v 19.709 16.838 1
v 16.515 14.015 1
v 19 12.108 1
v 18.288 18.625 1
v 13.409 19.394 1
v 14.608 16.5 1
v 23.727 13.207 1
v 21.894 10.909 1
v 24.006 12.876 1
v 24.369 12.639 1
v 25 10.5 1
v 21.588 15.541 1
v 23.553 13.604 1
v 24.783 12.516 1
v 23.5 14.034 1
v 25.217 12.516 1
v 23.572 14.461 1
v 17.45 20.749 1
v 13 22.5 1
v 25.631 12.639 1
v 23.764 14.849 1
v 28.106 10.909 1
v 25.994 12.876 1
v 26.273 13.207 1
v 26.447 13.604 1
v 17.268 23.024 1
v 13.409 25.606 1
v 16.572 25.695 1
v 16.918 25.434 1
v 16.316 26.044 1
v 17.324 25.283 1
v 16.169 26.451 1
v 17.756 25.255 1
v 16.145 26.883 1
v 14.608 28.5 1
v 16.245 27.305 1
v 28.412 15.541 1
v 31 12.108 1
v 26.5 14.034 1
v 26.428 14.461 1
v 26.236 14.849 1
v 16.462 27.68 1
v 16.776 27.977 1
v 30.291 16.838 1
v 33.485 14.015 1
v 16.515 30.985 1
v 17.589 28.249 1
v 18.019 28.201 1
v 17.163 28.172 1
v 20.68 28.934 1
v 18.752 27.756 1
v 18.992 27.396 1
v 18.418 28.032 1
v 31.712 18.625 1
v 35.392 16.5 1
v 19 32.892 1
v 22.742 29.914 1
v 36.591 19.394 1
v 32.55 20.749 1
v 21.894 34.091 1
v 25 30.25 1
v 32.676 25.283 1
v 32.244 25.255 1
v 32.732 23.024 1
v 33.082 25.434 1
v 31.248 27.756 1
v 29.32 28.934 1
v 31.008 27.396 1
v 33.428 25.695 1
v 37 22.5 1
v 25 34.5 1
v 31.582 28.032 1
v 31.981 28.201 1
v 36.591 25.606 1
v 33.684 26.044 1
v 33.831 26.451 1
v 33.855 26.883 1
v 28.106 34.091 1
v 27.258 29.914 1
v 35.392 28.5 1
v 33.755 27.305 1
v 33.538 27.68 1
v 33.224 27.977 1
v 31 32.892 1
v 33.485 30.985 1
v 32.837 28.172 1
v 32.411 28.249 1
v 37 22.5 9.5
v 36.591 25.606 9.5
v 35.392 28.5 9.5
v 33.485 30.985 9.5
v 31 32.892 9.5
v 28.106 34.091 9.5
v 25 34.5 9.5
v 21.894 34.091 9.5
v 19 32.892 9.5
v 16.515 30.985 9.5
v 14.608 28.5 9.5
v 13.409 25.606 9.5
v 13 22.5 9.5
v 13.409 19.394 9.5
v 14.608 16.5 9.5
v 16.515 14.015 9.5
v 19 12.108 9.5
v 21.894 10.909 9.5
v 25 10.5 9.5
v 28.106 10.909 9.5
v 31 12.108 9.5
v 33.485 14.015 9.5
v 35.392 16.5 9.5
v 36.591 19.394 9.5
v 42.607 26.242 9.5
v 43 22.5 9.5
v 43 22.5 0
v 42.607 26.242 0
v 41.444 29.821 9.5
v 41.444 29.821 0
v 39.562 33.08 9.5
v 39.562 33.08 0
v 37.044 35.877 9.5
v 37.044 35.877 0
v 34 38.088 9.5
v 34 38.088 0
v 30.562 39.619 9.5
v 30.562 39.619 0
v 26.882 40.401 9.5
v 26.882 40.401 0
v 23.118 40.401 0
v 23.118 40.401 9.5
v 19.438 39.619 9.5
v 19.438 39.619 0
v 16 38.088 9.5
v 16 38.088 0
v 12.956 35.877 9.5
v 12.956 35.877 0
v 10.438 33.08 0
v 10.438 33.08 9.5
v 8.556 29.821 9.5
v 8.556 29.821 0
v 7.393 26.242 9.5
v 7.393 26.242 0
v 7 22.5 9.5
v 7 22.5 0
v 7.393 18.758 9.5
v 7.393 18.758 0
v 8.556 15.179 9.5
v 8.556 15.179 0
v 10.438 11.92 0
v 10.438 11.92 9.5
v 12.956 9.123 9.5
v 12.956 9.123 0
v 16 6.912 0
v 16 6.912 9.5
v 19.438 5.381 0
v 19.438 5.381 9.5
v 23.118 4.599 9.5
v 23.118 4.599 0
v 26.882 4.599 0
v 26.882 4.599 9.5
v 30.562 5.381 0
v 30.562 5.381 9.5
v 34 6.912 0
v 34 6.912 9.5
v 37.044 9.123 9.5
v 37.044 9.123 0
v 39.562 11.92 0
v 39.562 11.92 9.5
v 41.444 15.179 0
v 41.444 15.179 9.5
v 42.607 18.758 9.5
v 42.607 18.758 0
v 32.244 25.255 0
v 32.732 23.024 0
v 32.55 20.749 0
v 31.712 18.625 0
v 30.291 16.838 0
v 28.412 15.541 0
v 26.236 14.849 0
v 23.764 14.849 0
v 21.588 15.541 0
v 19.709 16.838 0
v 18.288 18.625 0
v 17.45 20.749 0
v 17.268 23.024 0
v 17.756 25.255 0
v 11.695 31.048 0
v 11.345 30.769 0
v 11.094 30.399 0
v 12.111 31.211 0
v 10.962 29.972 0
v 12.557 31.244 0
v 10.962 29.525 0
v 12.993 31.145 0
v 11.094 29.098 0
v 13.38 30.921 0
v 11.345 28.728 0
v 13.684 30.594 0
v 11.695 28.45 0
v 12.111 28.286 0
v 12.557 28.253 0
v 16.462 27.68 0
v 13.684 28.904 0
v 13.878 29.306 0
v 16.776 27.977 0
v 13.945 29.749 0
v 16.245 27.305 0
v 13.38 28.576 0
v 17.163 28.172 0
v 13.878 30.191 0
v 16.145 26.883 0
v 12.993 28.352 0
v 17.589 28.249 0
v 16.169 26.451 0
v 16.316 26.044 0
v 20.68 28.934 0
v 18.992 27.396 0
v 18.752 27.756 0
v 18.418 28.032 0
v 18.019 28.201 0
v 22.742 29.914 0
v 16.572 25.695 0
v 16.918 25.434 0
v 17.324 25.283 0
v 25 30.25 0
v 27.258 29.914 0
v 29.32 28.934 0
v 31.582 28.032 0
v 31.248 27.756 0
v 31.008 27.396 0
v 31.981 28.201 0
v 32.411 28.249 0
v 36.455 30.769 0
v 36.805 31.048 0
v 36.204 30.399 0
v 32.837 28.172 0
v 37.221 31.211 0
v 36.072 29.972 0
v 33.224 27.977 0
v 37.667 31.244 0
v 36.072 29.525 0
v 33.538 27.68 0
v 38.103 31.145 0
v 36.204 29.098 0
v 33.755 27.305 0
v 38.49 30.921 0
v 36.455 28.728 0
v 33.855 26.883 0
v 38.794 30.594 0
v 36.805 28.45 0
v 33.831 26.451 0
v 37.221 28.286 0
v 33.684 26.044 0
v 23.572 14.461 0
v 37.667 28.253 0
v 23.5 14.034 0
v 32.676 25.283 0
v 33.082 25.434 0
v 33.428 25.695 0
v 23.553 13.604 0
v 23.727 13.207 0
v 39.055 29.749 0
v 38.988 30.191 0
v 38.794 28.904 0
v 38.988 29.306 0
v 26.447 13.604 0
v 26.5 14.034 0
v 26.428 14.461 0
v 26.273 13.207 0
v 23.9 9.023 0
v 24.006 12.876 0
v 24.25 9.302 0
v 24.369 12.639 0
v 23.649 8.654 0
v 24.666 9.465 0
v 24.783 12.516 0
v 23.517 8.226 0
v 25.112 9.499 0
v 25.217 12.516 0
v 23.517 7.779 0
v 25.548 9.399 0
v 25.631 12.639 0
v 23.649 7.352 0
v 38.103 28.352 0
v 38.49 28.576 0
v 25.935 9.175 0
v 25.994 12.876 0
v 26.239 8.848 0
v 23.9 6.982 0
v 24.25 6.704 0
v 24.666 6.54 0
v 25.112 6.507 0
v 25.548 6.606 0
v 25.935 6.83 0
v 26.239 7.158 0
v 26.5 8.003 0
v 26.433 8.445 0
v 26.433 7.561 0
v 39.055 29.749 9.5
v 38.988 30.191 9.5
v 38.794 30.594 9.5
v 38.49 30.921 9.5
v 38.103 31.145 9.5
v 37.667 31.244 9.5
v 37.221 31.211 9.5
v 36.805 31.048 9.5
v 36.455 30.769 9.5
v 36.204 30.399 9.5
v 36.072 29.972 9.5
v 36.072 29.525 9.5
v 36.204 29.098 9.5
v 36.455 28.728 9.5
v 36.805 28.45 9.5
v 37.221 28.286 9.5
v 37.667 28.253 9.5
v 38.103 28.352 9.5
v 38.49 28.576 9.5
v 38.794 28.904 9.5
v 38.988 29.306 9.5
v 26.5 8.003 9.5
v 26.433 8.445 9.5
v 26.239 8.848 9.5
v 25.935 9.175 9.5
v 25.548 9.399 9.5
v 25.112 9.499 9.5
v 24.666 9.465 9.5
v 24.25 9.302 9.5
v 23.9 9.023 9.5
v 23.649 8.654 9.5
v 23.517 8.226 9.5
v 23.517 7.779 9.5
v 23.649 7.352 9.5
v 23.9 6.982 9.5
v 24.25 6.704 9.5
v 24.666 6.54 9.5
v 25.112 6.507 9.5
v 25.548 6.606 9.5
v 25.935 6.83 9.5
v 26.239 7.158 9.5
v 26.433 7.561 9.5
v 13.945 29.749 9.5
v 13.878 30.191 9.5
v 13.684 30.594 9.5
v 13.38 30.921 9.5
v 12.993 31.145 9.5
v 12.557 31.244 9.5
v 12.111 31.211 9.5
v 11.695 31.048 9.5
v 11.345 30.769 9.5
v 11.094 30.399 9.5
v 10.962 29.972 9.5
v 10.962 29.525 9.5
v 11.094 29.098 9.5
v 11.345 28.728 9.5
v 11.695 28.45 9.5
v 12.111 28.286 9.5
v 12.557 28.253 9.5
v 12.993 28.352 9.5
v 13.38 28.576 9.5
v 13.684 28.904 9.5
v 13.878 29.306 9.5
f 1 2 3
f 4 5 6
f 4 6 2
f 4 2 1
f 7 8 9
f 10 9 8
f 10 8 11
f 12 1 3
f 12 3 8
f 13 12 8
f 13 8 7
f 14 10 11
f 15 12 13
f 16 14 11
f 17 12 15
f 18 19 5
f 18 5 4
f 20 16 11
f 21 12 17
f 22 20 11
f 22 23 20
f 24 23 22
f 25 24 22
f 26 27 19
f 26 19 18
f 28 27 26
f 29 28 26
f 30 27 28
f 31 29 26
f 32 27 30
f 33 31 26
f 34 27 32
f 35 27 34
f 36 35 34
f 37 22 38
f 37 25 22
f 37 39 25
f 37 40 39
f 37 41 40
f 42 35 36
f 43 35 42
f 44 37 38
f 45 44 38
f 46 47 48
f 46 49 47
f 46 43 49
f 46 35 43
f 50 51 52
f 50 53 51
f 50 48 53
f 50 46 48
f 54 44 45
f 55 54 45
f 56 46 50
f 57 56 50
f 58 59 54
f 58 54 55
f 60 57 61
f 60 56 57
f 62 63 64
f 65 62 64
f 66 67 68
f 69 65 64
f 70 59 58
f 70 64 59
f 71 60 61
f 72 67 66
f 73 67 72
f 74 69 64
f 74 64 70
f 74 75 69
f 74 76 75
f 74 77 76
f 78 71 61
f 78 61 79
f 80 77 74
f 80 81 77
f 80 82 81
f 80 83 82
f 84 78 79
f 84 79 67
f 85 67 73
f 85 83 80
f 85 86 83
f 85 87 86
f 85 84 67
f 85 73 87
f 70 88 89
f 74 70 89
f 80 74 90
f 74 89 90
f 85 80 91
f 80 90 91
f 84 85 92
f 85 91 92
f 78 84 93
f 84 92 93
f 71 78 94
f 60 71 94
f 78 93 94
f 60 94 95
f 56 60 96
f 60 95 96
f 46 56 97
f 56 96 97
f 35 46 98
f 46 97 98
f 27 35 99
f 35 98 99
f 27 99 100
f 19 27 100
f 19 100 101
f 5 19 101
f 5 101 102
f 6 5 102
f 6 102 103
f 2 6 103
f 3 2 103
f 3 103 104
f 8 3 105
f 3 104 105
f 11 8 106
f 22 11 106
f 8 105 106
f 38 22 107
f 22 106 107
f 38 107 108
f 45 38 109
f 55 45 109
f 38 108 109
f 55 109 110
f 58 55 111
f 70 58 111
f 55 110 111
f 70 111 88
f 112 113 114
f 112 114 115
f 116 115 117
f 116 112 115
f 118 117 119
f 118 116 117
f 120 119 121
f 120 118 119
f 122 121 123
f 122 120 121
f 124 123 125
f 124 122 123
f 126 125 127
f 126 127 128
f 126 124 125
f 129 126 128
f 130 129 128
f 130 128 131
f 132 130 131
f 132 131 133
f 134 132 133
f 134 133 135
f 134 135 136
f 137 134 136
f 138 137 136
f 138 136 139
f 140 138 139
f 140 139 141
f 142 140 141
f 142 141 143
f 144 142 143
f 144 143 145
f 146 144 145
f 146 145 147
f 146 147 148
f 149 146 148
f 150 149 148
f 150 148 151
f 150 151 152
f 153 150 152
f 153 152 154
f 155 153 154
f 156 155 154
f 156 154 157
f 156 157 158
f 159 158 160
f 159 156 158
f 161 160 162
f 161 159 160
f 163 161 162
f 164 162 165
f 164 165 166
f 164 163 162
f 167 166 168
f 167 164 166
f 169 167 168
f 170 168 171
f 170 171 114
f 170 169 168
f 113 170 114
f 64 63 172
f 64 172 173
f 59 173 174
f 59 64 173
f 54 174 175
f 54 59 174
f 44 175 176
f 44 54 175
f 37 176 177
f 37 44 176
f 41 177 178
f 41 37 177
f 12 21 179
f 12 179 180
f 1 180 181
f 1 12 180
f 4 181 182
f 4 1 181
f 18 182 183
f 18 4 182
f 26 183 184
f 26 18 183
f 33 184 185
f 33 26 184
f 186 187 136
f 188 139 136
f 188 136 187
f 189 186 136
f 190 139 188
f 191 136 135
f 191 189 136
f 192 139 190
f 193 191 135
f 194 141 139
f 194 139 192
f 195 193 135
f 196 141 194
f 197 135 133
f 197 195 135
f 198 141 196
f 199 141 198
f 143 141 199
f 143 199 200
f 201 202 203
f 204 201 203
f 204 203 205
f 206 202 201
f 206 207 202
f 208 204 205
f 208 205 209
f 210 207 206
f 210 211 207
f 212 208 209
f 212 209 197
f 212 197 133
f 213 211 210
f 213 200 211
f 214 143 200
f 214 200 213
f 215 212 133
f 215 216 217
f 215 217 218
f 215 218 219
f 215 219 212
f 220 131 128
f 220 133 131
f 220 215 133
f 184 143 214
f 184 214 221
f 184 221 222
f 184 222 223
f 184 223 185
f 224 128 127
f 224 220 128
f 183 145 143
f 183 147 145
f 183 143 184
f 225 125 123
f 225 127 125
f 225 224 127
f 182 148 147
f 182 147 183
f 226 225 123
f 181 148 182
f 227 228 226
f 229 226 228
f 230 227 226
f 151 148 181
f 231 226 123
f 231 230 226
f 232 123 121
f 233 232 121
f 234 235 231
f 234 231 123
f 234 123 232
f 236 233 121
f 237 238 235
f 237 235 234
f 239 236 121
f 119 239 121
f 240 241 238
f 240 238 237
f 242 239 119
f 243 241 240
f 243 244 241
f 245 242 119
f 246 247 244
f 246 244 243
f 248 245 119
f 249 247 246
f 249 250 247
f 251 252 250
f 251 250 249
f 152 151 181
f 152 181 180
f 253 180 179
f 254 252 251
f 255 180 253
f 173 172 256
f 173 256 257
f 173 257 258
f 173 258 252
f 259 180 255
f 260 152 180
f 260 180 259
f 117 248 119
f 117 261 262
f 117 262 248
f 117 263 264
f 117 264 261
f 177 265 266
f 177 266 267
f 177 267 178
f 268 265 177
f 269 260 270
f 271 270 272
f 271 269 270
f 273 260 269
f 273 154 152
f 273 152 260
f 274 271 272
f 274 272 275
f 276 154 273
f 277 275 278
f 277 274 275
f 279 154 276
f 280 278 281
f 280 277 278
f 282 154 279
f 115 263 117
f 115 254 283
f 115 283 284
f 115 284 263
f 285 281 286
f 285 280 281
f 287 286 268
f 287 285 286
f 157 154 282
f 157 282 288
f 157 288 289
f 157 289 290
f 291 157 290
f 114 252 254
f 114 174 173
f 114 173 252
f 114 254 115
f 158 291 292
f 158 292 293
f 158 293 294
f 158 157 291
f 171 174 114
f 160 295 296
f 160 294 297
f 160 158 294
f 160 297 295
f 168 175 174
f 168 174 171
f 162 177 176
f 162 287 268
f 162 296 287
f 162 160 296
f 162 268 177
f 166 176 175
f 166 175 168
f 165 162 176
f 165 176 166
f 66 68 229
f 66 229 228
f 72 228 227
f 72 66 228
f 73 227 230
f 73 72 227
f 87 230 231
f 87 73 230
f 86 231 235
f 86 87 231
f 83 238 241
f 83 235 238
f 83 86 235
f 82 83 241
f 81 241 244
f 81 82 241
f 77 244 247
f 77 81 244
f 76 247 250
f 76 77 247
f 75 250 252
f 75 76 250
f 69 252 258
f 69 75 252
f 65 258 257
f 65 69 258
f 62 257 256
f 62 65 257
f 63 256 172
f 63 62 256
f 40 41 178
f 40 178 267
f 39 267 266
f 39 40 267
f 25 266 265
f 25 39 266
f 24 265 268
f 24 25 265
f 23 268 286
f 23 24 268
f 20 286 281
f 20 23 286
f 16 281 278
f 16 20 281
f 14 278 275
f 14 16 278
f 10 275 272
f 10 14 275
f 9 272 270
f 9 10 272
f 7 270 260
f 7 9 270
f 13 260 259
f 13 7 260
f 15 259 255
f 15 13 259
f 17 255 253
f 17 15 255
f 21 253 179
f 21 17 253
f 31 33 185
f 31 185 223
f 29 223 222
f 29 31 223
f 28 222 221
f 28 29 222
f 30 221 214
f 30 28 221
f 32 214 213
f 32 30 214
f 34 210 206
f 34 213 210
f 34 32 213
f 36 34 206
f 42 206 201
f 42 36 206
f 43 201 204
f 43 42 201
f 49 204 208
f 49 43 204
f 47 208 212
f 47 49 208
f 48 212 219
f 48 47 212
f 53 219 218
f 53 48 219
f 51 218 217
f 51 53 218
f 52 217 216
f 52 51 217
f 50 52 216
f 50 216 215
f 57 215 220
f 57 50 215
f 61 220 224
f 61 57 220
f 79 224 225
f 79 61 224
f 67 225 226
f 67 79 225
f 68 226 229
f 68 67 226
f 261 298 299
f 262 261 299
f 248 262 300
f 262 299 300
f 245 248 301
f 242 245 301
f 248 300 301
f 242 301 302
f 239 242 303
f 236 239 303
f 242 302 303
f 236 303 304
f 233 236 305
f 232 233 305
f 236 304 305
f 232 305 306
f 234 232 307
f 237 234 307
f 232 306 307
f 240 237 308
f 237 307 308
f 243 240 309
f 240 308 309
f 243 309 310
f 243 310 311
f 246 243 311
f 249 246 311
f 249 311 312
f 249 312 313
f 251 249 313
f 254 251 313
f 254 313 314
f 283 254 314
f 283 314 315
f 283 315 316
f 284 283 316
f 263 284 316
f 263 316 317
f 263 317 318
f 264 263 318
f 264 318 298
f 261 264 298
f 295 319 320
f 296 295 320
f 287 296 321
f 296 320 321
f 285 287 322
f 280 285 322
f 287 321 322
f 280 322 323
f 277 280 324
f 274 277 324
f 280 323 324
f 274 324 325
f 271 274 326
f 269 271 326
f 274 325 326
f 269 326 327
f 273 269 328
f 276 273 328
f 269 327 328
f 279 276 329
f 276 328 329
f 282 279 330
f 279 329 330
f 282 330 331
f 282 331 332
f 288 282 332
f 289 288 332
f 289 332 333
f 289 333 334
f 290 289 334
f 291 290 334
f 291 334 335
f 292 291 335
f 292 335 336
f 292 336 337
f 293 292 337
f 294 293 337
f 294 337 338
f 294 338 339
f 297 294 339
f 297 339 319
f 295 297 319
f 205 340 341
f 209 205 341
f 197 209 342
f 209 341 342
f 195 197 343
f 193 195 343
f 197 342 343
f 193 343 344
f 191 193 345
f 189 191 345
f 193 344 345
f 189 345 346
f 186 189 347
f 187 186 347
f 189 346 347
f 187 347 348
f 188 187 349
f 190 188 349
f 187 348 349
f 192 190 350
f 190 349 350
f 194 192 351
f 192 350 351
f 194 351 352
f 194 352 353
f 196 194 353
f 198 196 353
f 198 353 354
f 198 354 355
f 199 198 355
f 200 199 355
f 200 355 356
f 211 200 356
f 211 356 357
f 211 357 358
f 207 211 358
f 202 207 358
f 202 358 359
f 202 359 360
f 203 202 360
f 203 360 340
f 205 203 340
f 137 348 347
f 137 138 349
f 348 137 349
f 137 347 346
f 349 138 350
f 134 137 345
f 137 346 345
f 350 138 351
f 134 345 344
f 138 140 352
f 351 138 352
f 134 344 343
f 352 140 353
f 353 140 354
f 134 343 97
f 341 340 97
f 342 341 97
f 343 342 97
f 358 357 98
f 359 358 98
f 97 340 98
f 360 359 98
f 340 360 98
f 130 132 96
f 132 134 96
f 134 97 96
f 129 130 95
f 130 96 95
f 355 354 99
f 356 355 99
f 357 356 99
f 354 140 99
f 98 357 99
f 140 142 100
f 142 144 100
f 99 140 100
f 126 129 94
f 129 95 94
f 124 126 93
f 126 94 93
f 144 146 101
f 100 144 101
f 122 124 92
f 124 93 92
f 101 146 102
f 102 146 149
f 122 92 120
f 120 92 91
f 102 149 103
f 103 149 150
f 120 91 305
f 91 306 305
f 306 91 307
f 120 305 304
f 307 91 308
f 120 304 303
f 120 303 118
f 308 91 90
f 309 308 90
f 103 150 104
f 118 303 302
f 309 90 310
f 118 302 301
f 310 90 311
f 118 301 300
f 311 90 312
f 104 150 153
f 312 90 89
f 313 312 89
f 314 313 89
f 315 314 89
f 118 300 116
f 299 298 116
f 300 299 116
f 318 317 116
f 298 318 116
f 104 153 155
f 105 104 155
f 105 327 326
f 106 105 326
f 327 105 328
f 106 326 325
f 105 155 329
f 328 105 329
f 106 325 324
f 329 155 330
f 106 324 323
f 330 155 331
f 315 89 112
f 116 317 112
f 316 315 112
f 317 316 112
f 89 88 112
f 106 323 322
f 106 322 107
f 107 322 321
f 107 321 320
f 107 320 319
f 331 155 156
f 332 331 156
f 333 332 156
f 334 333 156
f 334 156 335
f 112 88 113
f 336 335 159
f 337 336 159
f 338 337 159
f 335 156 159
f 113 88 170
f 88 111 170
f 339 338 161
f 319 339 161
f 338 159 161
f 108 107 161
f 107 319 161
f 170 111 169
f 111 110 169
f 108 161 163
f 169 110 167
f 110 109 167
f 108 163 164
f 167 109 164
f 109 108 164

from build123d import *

# Parameters (mm, degrees)
ESQUISSE1_W      = 50
ESQUISSE1_H      = 9.5
EXTRUSION1_DEPTH = 45
ESQUISSE2_R      = 1.5
EXTRUSION2_DEPTH = 45
ESQUISSE3_R      = 12
EXTRUSION3_DEPTH = 8.5
ESQUISSE4_R      = 36.120283588
ESQUISSE4_R_2    = 18
EXTRUSION4_DEPTH = 10.5


with BuildPart() as part:
    # Esquisse1 → Extrusion1 (new body)
    with BuildSketch(Plane(origin=(0, 0, 0), x_dir=(1, 0, 0), z_dir=(0, 1, 0))):
        with Locations((25, -4.75)):
            Rectangle(ESQUISSE1_W, ESQUISSE1_H)
    extrude(amount=EXTRUSION1_DEPTH)

    # Esquisse2 → Extrusion2 (cut)
    with BuildSketch(Plane.XY.offset(9.5)):
        with Locations((12.445, 29.74863263)):
            Circle(ESQUISSE2_R)
        with Locations((37.555, 29.74863263)):
            Circle(ESQUISSE2_R)
        with Locations((25, 8.002734741)):
            Circle(ESQUISSE2_R)
        with BuildLine():
            ThreePointArc((17.756055836, 25.254591249), (16.339745962, 27.5), (18.992481919, 27.396144045))
            ThreePointArc((18.992481919, 27.396144045), (25, 30.25), (31.007518081, 27.396144045))
            ThreePointArc((31.007518081, 27.396144045), (33.660254038, 27.5), (32.243944164, 25.254591249))
            ThreePointArc((32.243944164, 25.254591249), (31.711696879, 18.625), (26.236426083, 14.849264706))
            ThreePointArc((26.236426083, 14.849264706), (25, 12.5), (23.763573917, 14.849264706))
            ThreePointArc((23.763573917, 14.849264706), (18.288303121, 18.625), (17.756055836, 25.254591249))
        make_face()
    extrude(amount=-EXTRUSION2_DEPTH, mode=Mode.SUBTRACT)

    # Esquisse3 → Extrusion3 (cut)
    with BuildSketch(Plane.XY.offset(9.5)):
        with Locations((25, 22.5)):
            Circle(ESQUISSE3_R)
    extrude(amount=-EXTRUSION3_DEPTH, mode=Mode.SUBTRACT)

    # Esquisse4 → Extrusion4 (cut, through all)
    with BuildSketch(Plane.XY.offset(9.5)):
        with Locations((25, 22.5)):
            Circle(ESQUISSE4_R)
        with Locations((25, 22.5)):
            Circle(ESQUISSE4_R_2, mode=Mode.SUBTRACT)
    extrude(amount=-EXTRUSION4_DEPTH, mode=Mode.SUBTRACT)


solid = part.part
